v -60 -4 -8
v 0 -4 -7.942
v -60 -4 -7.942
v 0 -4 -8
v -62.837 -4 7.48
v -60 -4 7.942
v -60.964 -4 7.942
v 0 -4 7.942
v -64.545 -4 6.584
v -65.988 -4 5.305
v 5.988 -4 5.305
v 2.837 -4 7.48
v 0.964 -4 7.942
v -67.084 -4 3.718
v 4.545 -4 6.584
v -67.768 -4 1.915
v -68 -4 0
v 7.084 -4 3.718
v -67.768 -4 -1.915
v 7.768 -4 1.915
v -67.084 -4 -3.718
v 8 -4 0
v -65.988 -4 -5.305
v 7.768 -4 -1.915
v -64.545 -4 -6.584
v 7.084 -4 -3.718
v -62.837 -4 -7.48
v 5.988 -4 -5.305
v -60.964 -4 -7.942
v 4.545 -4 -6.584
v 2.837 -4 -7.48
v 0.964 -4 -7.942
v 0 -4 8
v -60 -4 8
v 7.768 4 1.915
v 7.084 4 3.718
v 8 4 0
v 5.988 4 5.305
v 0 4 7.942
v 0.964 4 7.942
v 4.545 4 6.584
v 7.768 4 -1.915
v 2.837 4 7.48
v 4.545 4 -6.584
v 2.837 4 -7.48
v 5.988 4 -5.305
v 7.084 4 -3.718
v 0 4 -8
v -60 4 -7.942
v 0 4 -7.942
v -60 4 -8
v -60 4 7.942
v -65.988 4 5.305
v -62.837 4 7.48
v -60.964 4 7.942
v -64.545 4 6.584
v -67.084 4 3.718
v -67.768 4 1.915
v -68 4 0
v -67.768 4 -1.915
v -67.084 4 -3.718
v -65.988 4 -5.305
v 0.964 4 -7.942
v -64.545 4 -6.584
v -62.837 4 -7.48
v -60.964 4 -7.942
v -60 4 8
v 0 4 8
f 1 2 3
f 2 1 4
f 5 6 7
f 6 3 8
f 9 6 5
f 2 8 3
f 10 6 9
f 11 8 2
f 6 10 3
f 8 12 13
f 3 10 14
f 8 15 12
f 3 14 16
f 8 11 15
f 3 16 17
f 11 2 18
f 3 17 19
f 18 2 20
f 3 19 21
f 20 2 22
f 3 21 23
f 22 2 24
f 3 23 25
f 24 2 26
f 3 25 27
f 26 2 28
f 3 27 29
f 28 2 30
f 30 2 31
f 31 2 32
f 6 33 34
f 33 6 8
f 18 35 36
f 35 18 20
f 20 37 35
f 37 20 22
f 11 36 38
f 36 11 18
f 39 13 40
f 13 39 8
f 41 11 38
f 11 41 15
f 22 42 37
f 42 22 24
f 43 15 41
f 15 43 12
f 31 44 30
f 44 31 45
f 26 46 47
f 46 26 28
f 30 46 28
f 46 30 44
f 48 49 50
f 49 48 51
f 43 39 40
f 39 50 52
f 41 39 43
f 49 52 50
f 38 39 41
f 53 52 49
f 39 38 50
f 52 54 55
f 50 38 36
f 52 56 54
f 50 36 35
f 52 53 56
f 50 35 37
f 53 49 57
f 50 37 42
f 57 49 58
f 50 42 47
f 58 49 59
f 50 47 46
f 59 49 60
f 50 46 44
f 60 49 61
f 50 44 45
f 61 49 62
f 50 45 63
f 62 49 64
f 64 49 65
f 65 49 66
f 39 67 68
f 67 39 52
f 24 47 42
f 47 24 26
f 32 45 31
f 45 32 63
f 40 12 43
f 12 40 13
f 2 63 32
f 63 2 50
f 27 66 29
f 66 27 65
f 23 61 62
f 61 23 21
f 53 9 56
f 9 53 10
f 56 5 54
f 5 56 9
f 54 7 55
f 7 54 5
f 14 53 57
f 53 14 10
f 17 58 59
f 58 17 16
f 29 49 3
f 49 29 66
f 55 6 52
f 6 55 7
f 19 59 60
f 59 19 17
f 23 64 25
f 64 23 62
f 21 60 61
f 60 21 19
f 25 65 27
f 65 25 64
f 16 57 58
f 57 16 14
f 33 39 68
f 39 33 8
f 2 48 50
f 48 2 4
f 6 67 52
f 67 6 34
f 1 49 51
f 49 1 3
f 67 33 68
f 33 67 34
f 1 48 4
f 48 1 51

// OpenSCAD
module oval(clength, cradius, cthick) {
	rotate([90,0,0]) union() {
		translate([clength/2,0,0]) cylinder(h = cthick,r = cradius, center = true);
		translate([-clength/2,0,0]) cylinder(h = cthick, r = cradius, center = true);
		cube(size = [clength, cradius*2, cthick], center = true);
	}
}
module caterpillar(clength, cradius, cthick) {
	color([0.1,0.1,0.1,1]) {
		difference() {
			oval(clength, cradius, cthick);
			oval(clength, cradius*0.9, cthick*1.1);
		}
	}
	color([0.8,0.8,0.8,1]) {
		oval(clength, cradius*0.9, cthick);
	}
}

translate([-30, 0, 0]) caterpillar(60, 8, 8);
